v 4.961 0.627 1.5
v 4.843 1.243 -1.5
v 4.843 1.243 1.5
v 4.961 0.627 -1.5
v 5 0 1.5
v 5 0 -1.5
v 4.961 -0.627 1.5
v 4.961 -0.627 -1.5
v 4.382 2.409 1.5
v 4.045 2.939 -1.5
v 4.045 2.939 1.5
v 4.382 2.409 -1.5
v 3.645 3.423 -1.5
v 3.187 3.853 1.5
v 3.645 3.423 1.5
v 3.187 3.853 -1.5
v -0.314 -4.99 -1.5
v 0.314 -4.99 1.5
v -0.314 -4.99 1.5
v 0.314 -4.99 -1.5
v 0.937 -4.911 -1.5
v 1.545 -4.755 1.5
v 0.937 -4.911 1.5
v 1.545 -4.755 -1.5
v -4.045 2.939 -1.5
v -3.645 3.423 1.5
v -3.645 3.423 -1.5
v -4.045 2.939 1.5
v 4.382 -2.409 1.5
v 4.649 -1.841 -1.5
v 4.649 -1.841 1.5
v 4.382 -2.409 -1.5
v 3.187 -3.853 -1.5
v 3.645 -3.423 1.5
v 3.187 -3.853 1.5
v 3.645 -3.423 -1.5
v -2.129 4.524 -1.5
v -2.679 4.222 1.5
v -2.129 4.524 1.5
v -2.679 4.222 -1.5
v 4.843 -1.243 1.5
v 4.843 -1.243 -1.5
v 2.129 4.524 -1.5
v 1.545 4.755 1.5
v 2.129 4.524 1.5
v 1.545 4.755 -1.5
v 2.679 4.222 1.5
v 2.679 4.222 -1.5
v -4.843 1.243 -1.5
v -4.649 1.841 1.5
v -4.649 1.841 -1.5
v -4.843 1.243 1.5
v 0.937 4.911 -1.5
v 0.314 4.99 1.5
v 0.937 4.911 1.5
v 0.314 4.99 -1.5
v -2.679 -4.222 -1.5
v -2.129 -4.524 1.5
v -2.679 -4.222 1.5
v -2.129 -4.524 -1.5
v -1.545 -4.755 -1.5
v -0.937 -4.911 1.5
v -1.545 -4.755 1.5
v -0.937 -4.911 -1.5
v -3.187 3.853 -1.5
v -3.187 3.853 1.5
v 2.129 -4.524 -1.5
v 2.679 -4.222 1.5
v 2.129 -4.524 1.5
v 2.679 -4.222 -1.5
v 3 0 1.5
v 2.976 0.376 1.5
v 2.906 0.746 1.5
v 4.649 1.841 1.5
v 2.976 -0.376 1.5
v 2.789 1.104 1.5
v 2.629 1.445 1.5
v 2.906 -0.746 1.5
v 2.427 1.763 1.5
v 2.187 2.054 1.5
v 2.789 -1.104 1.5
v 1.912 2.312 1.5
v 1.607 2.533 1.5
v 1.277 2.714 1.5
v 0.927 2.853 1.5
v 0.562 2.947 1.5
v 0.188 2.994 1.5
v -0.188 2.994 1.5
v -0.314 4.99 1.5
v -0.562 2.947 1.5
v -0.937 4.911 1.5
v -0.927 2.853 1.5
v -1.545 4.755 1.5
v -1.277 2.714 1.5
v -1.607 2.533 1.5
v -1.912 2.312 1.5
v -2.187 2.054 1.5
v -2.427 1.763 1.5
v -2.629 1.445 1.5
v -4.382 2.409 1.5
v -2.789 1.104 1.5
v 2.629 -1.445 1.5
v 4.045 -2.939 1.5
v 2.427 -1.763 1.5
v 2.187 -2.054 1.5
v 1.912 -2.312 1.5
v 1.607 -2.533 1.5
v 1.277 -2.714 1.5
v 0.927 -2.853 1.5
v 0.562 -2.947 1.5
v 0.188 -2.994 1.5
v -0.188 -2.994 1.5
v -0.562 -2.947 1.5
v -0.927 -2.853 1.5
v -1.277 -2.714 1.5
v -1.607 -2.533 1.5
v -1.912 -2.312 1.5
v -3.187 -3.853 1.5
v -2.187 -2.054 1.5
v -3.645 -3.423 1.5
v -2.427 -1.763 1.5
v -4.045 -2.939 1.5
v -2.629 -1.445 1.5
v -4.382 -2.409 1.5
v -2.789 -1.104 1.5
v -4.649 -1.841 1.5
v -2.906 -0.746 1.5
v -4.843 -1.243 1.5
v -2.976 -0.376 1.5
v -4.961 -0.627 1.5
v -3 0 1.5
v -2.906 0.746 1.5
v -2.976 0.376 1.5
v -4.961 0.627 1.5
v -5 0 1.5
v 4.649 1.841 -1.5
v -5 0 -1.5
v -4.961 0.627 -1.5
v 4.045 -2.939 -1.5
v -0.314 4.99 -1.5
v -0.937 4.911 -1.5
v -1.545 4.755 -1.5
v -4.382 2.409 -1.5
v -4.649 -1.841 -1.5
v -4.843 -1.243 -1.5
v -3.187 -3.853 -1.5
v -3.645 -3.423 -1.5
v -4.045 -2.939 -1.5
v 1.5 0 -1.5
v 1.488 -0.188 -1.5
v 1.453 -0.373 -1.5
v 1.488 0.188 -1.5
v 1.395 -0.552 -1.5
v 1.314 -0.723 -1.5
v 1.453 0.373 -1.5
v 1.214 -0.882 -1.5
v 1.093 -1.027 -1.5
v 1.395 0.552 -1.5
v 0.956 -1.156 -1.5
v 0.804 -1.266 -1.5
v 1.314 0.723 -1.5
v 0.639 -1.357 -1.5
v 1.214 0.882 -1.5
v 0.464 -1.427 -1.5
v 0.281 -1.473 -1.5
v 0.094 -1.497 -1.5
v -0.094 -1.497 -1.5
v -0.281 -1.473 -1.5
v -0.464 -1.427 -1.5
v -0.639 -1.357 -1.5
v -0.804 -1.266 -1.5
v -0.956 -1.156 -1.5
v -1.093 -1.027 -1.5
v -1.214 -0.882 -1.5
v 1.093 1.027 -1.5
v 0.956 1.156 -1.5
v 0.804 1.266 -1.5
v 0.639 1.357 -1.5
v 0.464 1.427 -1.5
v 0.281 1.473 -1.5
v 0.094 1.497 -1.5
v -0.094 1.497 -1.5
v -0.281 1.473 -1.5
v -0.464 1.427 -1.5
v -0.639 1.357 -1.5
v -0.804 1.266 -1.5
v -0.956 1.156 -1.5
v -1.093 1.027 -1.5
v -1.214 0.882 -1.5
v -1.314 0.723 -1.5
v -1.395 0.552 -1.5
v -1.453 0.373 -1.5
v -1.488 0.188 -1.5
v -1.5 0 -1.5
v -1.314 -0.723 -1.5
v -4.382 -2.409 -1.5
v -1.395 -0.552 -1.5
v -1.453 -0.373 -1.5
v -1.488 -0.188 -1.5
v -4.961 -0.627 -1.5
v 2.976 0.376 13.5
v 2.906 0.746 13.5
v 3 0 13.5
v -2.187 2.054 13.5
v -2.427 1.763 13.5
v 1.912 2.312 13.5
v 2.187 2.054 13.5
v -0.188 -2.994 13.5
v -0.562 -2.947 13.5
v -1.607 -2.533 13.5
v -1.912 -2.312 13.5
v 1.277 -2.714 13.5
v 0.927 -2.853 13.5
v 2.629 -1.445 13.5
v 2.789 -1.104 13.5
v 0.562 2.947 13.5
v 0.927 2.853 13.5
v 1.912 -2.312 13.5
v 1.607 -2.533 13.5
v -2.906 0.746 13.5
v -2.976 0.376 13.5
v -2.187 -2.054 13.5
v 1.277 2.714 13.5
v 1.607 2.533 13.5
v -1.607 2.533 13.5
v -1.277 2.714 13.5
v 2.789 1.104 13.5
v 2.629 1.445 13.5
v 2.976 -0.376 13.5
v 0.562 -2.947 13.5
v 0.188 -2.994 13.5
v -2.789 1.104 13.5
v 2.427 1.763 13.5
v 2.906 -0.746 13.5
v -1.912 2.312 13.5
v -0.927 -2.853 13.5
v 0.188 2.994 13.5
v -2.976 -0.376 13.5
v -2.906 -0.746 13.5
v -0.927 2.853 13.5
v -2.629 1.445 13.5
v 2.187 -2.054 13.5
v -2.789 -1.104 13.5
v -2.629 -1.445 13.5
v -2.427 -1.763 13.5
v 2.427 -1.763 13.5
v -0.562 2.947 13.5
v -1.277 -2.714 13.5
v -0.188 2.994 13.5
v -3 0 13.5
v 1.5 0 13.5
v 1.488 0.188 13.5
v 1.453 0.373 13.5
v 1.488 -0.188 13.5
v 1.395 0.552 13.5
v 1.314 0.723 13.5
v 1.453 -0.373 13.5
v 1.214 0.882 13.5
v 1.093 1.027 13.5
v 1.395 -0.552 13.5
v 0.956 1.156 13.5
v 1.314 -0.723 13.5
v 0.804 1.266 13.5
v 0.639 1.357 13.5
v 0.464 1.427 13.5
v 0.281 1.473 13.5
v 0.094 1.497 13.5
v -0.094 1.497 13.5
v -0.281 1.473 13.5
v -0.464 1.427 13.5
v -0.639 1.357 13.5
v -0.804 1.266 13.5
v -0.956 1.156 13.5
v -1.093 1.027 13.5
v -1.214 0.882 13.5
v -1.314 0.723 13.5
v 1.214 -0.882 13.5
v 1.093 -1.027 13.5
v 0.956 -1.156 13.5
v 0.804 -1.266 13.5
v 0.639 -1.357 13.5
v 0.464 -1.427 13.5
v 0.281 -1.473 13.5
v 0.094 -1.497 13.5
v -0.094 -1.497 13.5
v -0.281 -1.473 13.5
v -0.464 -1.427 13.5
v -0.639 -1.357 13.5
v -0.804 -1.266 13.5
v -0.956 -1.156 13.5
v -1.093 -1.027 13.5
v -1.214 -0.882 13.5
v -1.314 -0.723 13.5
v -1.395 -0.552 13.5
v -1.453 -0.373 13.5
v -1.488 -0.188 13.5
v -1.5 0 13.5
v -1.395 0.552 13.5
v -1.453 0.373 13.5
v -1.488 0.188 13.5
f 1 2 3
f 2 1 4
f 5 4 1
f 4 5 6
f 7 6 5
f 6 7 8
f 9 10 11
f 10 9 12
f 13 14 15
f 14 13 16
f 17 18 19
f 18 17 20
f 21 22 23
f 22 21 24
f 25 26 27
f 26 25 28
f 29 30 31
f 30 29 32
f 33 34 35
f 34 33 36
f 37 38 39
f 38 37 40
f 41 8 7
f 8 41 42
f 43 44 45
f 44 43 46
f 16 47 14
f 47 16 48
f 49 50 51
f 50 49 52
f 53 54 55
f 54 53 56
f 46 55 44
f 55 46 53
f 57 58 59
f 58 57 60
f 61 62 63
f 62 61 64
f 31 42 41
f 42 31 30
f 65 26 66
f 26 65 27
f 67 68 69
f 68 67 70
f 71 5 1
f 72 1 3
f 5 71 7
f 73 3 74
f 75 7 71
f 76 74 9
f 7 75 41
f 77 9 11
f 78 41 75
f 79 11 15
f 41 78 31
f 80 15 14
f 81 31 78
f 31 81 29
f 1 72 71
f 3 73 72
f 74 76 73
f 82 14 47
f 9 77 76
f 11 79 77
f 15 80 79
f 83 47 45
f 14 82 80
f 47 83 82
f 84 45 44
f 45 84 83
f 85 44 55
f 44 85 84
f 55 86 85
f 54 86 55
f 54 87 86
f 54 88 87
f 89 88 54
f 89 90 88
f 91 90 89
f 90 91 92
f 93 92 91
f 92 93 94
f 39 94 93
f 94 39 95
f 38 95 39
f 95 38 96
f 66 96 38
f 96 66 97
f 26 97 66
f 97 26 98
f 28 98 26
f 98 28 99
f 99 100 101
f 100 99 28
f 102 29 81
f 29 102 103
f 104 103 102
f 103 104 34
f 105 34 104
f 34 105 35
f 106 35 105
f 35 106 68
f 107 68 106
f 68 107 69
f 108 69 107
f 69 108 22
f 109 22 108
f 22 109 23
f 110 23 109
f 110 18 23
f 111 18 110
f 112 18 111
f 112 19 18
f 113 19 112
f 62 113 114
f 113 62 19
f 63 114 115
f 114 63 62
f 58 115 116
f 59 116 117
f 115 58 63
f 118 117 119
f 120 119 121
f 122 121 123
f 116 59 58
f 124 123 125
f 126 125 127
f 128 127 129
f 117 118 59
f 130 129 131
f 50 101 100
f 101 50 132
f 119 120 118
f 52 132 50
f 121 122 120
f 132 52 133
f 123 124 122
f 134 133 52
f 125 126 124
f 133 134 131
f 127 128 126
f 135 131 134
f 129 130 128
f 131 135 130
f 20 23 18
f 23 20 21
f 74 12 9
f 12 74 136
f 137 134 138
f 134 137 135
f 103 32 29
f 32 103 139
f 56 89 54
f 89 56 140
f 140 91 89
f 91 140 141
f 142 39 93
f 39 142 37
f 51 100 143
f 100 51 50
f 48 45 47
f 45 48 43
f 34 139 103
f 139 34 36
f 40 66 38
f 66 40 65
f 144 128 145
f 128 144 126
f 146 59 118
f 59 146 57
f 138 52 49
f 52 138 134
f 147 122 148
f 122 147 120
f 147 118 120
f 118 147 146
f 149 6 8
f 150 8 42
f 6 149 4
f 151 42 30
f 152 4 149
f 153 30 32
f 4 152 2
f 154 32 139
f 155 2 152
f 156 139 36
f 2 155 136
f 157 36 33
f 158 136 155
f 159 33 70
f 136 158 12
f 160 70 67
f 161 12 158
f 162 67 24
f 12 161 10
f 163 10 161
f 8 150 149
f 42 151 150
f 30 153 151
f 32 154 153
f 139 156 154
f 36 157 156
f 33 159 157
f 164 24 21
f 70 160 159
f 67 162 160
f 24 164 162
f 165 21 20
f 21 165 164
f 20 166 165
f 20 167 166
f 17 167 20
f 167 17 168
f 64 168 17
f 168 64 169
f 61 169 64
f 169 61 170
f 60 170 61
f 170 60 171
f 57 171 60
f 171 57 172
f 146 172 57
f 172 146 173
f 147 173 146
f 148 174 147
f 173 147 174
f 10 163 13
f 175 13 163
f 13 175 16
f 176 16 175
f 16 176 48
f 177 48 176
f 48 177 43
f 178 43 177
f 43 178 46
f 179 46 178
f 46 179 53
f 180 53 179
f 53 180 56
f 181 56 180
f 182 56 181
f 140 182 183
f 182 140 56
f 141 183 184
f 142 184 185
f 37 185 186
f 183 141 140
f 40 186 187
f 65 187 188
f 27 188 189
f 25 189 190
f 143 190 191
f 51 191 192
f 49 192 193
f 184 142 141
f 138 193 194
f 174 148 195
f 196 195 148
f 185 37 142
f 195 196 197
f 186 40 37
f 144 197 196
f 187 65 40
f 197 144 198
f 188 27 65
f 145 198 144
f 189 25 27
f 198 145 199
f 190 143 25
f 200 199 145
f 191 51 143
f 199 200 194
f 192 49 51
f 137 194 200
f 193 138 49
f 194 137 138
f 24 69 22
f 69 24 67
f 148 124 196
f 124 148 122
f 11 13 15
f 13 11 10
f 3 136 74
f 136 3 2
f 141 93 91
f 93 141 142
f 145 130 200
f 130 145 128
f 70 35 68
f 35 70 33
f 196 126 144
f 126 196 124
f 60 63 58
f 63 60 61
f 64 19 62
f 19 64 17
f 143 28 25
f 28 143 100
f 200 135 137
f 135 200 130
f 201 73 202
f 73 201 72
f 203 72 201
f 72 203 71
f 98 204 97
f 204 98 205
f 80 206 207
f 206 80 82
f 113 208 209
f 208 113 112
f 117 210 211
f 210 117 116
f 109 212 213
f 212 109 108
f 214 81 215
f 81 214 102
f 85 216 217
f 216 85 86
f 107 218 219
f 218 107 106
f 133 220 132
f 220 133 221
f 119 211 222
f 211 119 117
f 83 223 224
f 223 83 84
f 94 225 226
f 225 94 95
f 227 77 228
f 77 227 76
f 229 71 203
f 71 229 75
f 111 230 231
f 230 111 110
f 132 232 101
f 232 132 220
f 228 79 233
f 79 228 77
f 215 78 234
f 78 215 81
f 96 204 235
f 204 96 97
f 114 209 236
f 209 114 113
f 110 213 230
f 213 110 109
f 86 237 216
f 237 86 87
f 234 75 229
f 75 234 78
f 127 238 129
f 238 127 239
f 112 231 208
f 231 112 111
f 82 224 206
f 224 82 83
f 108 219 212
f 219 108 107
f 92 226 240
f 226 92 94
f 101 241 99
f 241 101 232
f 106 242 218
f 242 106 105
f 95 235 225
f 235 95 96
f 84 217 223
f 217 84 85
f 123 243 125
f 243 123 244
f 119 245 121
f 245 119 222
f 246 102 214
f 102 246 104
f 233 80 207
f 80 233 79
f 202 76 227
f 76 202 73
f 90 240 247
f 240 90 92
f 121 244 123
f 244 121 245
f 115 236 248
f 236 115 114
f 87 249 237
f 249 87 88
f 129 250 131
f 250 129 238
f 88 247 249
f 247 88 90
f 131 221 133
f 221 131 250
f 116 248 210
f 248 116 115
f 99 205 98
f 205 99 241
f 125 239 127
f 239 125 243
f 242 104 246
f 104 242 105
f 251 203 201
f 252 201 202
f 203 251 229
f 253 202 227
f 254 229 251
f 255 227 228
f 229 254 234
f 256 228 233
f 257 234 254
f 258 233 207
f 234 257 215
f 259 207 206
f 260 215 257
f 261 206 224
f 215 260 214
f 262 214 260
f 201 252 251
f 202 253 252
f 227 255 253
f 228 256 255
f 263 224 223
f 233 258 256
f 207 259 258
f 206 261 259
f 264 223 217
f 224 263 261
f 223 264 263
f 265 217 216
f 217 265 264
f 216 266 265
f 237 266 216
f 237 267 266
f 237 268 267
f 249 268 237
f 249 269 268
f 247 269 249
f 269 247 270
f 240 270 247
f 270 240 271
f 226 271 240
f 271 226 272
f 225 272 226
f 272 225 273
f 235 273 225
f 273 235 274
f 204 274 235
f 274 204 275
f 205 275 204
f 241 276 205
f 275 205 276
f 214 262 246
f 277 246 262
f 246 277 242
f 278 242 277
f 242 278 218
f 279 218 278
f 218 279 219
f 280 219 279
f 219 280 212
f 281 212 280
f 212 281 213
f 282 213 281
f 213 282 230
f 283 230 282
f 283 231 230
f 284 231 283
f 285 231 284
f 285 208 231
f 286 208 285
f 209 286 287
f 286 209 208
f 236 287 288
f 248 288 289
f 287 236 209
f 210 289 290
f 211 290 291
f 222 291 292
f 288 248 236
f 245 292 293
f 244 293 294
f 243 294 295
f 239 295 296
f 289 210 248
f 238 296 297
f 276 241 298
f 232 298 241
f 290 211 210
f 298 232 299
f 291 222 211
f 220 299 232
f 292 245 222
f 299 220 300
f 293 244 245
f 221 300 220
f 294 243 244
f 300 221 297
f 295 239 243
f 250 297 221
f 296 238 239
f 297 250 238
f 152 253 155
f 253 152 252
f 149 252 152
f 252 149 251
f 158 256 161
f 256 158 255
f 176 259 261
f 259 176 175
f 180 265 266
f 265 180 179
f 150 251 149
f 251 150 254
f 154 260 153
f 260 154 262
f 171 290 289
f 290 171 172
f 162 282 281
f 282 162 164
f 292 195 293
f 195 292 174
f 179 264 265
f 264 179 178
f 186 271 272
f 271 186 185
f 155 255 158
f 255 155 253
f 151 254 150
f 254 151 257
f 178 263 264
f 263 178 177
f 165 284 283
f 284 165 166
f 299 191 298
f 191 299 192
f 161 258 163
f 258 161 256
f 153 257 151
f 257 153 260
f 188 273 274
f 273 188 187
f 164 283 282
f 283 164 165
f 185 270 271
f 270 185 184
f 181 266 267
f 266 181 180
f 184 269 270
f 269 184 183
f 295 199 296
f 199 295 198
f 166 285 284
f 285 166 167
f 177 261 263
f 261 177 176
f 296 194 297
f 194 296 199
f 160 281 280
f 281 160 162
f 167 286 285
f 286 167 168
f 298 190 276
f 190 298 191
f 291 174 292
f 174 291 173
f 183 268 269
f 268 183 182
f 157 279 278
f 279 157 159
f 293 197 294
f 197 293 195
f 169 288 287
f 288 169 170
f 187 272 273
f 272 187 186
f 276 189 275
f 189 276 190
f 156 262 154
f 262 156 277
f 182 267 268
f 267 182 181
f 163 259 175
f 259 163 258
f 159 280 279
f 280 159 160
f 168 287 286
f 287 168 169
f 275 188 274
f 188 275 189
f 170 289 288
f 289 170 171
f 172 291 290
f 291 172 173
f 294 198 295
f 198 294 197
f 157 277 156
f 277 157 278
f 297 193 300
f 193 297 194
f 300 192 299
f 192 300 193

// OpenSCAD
$fn = 50;


difference() {
	union() {
		translate(v = [0, 0, -1.5000000000]) {
			cylinder(h = 3, r = 5.0000000000);
		}
		translate(v = [0, 0, -1.5000000000]) {
			cylinder(h = 15, r = 3.0000000000);
		}
	}
	union() {
		translate(v = [0, 0, -50.0000000000]) {
			cylinder(h = 100, r = 1.5000000000);
		}
	}
}
